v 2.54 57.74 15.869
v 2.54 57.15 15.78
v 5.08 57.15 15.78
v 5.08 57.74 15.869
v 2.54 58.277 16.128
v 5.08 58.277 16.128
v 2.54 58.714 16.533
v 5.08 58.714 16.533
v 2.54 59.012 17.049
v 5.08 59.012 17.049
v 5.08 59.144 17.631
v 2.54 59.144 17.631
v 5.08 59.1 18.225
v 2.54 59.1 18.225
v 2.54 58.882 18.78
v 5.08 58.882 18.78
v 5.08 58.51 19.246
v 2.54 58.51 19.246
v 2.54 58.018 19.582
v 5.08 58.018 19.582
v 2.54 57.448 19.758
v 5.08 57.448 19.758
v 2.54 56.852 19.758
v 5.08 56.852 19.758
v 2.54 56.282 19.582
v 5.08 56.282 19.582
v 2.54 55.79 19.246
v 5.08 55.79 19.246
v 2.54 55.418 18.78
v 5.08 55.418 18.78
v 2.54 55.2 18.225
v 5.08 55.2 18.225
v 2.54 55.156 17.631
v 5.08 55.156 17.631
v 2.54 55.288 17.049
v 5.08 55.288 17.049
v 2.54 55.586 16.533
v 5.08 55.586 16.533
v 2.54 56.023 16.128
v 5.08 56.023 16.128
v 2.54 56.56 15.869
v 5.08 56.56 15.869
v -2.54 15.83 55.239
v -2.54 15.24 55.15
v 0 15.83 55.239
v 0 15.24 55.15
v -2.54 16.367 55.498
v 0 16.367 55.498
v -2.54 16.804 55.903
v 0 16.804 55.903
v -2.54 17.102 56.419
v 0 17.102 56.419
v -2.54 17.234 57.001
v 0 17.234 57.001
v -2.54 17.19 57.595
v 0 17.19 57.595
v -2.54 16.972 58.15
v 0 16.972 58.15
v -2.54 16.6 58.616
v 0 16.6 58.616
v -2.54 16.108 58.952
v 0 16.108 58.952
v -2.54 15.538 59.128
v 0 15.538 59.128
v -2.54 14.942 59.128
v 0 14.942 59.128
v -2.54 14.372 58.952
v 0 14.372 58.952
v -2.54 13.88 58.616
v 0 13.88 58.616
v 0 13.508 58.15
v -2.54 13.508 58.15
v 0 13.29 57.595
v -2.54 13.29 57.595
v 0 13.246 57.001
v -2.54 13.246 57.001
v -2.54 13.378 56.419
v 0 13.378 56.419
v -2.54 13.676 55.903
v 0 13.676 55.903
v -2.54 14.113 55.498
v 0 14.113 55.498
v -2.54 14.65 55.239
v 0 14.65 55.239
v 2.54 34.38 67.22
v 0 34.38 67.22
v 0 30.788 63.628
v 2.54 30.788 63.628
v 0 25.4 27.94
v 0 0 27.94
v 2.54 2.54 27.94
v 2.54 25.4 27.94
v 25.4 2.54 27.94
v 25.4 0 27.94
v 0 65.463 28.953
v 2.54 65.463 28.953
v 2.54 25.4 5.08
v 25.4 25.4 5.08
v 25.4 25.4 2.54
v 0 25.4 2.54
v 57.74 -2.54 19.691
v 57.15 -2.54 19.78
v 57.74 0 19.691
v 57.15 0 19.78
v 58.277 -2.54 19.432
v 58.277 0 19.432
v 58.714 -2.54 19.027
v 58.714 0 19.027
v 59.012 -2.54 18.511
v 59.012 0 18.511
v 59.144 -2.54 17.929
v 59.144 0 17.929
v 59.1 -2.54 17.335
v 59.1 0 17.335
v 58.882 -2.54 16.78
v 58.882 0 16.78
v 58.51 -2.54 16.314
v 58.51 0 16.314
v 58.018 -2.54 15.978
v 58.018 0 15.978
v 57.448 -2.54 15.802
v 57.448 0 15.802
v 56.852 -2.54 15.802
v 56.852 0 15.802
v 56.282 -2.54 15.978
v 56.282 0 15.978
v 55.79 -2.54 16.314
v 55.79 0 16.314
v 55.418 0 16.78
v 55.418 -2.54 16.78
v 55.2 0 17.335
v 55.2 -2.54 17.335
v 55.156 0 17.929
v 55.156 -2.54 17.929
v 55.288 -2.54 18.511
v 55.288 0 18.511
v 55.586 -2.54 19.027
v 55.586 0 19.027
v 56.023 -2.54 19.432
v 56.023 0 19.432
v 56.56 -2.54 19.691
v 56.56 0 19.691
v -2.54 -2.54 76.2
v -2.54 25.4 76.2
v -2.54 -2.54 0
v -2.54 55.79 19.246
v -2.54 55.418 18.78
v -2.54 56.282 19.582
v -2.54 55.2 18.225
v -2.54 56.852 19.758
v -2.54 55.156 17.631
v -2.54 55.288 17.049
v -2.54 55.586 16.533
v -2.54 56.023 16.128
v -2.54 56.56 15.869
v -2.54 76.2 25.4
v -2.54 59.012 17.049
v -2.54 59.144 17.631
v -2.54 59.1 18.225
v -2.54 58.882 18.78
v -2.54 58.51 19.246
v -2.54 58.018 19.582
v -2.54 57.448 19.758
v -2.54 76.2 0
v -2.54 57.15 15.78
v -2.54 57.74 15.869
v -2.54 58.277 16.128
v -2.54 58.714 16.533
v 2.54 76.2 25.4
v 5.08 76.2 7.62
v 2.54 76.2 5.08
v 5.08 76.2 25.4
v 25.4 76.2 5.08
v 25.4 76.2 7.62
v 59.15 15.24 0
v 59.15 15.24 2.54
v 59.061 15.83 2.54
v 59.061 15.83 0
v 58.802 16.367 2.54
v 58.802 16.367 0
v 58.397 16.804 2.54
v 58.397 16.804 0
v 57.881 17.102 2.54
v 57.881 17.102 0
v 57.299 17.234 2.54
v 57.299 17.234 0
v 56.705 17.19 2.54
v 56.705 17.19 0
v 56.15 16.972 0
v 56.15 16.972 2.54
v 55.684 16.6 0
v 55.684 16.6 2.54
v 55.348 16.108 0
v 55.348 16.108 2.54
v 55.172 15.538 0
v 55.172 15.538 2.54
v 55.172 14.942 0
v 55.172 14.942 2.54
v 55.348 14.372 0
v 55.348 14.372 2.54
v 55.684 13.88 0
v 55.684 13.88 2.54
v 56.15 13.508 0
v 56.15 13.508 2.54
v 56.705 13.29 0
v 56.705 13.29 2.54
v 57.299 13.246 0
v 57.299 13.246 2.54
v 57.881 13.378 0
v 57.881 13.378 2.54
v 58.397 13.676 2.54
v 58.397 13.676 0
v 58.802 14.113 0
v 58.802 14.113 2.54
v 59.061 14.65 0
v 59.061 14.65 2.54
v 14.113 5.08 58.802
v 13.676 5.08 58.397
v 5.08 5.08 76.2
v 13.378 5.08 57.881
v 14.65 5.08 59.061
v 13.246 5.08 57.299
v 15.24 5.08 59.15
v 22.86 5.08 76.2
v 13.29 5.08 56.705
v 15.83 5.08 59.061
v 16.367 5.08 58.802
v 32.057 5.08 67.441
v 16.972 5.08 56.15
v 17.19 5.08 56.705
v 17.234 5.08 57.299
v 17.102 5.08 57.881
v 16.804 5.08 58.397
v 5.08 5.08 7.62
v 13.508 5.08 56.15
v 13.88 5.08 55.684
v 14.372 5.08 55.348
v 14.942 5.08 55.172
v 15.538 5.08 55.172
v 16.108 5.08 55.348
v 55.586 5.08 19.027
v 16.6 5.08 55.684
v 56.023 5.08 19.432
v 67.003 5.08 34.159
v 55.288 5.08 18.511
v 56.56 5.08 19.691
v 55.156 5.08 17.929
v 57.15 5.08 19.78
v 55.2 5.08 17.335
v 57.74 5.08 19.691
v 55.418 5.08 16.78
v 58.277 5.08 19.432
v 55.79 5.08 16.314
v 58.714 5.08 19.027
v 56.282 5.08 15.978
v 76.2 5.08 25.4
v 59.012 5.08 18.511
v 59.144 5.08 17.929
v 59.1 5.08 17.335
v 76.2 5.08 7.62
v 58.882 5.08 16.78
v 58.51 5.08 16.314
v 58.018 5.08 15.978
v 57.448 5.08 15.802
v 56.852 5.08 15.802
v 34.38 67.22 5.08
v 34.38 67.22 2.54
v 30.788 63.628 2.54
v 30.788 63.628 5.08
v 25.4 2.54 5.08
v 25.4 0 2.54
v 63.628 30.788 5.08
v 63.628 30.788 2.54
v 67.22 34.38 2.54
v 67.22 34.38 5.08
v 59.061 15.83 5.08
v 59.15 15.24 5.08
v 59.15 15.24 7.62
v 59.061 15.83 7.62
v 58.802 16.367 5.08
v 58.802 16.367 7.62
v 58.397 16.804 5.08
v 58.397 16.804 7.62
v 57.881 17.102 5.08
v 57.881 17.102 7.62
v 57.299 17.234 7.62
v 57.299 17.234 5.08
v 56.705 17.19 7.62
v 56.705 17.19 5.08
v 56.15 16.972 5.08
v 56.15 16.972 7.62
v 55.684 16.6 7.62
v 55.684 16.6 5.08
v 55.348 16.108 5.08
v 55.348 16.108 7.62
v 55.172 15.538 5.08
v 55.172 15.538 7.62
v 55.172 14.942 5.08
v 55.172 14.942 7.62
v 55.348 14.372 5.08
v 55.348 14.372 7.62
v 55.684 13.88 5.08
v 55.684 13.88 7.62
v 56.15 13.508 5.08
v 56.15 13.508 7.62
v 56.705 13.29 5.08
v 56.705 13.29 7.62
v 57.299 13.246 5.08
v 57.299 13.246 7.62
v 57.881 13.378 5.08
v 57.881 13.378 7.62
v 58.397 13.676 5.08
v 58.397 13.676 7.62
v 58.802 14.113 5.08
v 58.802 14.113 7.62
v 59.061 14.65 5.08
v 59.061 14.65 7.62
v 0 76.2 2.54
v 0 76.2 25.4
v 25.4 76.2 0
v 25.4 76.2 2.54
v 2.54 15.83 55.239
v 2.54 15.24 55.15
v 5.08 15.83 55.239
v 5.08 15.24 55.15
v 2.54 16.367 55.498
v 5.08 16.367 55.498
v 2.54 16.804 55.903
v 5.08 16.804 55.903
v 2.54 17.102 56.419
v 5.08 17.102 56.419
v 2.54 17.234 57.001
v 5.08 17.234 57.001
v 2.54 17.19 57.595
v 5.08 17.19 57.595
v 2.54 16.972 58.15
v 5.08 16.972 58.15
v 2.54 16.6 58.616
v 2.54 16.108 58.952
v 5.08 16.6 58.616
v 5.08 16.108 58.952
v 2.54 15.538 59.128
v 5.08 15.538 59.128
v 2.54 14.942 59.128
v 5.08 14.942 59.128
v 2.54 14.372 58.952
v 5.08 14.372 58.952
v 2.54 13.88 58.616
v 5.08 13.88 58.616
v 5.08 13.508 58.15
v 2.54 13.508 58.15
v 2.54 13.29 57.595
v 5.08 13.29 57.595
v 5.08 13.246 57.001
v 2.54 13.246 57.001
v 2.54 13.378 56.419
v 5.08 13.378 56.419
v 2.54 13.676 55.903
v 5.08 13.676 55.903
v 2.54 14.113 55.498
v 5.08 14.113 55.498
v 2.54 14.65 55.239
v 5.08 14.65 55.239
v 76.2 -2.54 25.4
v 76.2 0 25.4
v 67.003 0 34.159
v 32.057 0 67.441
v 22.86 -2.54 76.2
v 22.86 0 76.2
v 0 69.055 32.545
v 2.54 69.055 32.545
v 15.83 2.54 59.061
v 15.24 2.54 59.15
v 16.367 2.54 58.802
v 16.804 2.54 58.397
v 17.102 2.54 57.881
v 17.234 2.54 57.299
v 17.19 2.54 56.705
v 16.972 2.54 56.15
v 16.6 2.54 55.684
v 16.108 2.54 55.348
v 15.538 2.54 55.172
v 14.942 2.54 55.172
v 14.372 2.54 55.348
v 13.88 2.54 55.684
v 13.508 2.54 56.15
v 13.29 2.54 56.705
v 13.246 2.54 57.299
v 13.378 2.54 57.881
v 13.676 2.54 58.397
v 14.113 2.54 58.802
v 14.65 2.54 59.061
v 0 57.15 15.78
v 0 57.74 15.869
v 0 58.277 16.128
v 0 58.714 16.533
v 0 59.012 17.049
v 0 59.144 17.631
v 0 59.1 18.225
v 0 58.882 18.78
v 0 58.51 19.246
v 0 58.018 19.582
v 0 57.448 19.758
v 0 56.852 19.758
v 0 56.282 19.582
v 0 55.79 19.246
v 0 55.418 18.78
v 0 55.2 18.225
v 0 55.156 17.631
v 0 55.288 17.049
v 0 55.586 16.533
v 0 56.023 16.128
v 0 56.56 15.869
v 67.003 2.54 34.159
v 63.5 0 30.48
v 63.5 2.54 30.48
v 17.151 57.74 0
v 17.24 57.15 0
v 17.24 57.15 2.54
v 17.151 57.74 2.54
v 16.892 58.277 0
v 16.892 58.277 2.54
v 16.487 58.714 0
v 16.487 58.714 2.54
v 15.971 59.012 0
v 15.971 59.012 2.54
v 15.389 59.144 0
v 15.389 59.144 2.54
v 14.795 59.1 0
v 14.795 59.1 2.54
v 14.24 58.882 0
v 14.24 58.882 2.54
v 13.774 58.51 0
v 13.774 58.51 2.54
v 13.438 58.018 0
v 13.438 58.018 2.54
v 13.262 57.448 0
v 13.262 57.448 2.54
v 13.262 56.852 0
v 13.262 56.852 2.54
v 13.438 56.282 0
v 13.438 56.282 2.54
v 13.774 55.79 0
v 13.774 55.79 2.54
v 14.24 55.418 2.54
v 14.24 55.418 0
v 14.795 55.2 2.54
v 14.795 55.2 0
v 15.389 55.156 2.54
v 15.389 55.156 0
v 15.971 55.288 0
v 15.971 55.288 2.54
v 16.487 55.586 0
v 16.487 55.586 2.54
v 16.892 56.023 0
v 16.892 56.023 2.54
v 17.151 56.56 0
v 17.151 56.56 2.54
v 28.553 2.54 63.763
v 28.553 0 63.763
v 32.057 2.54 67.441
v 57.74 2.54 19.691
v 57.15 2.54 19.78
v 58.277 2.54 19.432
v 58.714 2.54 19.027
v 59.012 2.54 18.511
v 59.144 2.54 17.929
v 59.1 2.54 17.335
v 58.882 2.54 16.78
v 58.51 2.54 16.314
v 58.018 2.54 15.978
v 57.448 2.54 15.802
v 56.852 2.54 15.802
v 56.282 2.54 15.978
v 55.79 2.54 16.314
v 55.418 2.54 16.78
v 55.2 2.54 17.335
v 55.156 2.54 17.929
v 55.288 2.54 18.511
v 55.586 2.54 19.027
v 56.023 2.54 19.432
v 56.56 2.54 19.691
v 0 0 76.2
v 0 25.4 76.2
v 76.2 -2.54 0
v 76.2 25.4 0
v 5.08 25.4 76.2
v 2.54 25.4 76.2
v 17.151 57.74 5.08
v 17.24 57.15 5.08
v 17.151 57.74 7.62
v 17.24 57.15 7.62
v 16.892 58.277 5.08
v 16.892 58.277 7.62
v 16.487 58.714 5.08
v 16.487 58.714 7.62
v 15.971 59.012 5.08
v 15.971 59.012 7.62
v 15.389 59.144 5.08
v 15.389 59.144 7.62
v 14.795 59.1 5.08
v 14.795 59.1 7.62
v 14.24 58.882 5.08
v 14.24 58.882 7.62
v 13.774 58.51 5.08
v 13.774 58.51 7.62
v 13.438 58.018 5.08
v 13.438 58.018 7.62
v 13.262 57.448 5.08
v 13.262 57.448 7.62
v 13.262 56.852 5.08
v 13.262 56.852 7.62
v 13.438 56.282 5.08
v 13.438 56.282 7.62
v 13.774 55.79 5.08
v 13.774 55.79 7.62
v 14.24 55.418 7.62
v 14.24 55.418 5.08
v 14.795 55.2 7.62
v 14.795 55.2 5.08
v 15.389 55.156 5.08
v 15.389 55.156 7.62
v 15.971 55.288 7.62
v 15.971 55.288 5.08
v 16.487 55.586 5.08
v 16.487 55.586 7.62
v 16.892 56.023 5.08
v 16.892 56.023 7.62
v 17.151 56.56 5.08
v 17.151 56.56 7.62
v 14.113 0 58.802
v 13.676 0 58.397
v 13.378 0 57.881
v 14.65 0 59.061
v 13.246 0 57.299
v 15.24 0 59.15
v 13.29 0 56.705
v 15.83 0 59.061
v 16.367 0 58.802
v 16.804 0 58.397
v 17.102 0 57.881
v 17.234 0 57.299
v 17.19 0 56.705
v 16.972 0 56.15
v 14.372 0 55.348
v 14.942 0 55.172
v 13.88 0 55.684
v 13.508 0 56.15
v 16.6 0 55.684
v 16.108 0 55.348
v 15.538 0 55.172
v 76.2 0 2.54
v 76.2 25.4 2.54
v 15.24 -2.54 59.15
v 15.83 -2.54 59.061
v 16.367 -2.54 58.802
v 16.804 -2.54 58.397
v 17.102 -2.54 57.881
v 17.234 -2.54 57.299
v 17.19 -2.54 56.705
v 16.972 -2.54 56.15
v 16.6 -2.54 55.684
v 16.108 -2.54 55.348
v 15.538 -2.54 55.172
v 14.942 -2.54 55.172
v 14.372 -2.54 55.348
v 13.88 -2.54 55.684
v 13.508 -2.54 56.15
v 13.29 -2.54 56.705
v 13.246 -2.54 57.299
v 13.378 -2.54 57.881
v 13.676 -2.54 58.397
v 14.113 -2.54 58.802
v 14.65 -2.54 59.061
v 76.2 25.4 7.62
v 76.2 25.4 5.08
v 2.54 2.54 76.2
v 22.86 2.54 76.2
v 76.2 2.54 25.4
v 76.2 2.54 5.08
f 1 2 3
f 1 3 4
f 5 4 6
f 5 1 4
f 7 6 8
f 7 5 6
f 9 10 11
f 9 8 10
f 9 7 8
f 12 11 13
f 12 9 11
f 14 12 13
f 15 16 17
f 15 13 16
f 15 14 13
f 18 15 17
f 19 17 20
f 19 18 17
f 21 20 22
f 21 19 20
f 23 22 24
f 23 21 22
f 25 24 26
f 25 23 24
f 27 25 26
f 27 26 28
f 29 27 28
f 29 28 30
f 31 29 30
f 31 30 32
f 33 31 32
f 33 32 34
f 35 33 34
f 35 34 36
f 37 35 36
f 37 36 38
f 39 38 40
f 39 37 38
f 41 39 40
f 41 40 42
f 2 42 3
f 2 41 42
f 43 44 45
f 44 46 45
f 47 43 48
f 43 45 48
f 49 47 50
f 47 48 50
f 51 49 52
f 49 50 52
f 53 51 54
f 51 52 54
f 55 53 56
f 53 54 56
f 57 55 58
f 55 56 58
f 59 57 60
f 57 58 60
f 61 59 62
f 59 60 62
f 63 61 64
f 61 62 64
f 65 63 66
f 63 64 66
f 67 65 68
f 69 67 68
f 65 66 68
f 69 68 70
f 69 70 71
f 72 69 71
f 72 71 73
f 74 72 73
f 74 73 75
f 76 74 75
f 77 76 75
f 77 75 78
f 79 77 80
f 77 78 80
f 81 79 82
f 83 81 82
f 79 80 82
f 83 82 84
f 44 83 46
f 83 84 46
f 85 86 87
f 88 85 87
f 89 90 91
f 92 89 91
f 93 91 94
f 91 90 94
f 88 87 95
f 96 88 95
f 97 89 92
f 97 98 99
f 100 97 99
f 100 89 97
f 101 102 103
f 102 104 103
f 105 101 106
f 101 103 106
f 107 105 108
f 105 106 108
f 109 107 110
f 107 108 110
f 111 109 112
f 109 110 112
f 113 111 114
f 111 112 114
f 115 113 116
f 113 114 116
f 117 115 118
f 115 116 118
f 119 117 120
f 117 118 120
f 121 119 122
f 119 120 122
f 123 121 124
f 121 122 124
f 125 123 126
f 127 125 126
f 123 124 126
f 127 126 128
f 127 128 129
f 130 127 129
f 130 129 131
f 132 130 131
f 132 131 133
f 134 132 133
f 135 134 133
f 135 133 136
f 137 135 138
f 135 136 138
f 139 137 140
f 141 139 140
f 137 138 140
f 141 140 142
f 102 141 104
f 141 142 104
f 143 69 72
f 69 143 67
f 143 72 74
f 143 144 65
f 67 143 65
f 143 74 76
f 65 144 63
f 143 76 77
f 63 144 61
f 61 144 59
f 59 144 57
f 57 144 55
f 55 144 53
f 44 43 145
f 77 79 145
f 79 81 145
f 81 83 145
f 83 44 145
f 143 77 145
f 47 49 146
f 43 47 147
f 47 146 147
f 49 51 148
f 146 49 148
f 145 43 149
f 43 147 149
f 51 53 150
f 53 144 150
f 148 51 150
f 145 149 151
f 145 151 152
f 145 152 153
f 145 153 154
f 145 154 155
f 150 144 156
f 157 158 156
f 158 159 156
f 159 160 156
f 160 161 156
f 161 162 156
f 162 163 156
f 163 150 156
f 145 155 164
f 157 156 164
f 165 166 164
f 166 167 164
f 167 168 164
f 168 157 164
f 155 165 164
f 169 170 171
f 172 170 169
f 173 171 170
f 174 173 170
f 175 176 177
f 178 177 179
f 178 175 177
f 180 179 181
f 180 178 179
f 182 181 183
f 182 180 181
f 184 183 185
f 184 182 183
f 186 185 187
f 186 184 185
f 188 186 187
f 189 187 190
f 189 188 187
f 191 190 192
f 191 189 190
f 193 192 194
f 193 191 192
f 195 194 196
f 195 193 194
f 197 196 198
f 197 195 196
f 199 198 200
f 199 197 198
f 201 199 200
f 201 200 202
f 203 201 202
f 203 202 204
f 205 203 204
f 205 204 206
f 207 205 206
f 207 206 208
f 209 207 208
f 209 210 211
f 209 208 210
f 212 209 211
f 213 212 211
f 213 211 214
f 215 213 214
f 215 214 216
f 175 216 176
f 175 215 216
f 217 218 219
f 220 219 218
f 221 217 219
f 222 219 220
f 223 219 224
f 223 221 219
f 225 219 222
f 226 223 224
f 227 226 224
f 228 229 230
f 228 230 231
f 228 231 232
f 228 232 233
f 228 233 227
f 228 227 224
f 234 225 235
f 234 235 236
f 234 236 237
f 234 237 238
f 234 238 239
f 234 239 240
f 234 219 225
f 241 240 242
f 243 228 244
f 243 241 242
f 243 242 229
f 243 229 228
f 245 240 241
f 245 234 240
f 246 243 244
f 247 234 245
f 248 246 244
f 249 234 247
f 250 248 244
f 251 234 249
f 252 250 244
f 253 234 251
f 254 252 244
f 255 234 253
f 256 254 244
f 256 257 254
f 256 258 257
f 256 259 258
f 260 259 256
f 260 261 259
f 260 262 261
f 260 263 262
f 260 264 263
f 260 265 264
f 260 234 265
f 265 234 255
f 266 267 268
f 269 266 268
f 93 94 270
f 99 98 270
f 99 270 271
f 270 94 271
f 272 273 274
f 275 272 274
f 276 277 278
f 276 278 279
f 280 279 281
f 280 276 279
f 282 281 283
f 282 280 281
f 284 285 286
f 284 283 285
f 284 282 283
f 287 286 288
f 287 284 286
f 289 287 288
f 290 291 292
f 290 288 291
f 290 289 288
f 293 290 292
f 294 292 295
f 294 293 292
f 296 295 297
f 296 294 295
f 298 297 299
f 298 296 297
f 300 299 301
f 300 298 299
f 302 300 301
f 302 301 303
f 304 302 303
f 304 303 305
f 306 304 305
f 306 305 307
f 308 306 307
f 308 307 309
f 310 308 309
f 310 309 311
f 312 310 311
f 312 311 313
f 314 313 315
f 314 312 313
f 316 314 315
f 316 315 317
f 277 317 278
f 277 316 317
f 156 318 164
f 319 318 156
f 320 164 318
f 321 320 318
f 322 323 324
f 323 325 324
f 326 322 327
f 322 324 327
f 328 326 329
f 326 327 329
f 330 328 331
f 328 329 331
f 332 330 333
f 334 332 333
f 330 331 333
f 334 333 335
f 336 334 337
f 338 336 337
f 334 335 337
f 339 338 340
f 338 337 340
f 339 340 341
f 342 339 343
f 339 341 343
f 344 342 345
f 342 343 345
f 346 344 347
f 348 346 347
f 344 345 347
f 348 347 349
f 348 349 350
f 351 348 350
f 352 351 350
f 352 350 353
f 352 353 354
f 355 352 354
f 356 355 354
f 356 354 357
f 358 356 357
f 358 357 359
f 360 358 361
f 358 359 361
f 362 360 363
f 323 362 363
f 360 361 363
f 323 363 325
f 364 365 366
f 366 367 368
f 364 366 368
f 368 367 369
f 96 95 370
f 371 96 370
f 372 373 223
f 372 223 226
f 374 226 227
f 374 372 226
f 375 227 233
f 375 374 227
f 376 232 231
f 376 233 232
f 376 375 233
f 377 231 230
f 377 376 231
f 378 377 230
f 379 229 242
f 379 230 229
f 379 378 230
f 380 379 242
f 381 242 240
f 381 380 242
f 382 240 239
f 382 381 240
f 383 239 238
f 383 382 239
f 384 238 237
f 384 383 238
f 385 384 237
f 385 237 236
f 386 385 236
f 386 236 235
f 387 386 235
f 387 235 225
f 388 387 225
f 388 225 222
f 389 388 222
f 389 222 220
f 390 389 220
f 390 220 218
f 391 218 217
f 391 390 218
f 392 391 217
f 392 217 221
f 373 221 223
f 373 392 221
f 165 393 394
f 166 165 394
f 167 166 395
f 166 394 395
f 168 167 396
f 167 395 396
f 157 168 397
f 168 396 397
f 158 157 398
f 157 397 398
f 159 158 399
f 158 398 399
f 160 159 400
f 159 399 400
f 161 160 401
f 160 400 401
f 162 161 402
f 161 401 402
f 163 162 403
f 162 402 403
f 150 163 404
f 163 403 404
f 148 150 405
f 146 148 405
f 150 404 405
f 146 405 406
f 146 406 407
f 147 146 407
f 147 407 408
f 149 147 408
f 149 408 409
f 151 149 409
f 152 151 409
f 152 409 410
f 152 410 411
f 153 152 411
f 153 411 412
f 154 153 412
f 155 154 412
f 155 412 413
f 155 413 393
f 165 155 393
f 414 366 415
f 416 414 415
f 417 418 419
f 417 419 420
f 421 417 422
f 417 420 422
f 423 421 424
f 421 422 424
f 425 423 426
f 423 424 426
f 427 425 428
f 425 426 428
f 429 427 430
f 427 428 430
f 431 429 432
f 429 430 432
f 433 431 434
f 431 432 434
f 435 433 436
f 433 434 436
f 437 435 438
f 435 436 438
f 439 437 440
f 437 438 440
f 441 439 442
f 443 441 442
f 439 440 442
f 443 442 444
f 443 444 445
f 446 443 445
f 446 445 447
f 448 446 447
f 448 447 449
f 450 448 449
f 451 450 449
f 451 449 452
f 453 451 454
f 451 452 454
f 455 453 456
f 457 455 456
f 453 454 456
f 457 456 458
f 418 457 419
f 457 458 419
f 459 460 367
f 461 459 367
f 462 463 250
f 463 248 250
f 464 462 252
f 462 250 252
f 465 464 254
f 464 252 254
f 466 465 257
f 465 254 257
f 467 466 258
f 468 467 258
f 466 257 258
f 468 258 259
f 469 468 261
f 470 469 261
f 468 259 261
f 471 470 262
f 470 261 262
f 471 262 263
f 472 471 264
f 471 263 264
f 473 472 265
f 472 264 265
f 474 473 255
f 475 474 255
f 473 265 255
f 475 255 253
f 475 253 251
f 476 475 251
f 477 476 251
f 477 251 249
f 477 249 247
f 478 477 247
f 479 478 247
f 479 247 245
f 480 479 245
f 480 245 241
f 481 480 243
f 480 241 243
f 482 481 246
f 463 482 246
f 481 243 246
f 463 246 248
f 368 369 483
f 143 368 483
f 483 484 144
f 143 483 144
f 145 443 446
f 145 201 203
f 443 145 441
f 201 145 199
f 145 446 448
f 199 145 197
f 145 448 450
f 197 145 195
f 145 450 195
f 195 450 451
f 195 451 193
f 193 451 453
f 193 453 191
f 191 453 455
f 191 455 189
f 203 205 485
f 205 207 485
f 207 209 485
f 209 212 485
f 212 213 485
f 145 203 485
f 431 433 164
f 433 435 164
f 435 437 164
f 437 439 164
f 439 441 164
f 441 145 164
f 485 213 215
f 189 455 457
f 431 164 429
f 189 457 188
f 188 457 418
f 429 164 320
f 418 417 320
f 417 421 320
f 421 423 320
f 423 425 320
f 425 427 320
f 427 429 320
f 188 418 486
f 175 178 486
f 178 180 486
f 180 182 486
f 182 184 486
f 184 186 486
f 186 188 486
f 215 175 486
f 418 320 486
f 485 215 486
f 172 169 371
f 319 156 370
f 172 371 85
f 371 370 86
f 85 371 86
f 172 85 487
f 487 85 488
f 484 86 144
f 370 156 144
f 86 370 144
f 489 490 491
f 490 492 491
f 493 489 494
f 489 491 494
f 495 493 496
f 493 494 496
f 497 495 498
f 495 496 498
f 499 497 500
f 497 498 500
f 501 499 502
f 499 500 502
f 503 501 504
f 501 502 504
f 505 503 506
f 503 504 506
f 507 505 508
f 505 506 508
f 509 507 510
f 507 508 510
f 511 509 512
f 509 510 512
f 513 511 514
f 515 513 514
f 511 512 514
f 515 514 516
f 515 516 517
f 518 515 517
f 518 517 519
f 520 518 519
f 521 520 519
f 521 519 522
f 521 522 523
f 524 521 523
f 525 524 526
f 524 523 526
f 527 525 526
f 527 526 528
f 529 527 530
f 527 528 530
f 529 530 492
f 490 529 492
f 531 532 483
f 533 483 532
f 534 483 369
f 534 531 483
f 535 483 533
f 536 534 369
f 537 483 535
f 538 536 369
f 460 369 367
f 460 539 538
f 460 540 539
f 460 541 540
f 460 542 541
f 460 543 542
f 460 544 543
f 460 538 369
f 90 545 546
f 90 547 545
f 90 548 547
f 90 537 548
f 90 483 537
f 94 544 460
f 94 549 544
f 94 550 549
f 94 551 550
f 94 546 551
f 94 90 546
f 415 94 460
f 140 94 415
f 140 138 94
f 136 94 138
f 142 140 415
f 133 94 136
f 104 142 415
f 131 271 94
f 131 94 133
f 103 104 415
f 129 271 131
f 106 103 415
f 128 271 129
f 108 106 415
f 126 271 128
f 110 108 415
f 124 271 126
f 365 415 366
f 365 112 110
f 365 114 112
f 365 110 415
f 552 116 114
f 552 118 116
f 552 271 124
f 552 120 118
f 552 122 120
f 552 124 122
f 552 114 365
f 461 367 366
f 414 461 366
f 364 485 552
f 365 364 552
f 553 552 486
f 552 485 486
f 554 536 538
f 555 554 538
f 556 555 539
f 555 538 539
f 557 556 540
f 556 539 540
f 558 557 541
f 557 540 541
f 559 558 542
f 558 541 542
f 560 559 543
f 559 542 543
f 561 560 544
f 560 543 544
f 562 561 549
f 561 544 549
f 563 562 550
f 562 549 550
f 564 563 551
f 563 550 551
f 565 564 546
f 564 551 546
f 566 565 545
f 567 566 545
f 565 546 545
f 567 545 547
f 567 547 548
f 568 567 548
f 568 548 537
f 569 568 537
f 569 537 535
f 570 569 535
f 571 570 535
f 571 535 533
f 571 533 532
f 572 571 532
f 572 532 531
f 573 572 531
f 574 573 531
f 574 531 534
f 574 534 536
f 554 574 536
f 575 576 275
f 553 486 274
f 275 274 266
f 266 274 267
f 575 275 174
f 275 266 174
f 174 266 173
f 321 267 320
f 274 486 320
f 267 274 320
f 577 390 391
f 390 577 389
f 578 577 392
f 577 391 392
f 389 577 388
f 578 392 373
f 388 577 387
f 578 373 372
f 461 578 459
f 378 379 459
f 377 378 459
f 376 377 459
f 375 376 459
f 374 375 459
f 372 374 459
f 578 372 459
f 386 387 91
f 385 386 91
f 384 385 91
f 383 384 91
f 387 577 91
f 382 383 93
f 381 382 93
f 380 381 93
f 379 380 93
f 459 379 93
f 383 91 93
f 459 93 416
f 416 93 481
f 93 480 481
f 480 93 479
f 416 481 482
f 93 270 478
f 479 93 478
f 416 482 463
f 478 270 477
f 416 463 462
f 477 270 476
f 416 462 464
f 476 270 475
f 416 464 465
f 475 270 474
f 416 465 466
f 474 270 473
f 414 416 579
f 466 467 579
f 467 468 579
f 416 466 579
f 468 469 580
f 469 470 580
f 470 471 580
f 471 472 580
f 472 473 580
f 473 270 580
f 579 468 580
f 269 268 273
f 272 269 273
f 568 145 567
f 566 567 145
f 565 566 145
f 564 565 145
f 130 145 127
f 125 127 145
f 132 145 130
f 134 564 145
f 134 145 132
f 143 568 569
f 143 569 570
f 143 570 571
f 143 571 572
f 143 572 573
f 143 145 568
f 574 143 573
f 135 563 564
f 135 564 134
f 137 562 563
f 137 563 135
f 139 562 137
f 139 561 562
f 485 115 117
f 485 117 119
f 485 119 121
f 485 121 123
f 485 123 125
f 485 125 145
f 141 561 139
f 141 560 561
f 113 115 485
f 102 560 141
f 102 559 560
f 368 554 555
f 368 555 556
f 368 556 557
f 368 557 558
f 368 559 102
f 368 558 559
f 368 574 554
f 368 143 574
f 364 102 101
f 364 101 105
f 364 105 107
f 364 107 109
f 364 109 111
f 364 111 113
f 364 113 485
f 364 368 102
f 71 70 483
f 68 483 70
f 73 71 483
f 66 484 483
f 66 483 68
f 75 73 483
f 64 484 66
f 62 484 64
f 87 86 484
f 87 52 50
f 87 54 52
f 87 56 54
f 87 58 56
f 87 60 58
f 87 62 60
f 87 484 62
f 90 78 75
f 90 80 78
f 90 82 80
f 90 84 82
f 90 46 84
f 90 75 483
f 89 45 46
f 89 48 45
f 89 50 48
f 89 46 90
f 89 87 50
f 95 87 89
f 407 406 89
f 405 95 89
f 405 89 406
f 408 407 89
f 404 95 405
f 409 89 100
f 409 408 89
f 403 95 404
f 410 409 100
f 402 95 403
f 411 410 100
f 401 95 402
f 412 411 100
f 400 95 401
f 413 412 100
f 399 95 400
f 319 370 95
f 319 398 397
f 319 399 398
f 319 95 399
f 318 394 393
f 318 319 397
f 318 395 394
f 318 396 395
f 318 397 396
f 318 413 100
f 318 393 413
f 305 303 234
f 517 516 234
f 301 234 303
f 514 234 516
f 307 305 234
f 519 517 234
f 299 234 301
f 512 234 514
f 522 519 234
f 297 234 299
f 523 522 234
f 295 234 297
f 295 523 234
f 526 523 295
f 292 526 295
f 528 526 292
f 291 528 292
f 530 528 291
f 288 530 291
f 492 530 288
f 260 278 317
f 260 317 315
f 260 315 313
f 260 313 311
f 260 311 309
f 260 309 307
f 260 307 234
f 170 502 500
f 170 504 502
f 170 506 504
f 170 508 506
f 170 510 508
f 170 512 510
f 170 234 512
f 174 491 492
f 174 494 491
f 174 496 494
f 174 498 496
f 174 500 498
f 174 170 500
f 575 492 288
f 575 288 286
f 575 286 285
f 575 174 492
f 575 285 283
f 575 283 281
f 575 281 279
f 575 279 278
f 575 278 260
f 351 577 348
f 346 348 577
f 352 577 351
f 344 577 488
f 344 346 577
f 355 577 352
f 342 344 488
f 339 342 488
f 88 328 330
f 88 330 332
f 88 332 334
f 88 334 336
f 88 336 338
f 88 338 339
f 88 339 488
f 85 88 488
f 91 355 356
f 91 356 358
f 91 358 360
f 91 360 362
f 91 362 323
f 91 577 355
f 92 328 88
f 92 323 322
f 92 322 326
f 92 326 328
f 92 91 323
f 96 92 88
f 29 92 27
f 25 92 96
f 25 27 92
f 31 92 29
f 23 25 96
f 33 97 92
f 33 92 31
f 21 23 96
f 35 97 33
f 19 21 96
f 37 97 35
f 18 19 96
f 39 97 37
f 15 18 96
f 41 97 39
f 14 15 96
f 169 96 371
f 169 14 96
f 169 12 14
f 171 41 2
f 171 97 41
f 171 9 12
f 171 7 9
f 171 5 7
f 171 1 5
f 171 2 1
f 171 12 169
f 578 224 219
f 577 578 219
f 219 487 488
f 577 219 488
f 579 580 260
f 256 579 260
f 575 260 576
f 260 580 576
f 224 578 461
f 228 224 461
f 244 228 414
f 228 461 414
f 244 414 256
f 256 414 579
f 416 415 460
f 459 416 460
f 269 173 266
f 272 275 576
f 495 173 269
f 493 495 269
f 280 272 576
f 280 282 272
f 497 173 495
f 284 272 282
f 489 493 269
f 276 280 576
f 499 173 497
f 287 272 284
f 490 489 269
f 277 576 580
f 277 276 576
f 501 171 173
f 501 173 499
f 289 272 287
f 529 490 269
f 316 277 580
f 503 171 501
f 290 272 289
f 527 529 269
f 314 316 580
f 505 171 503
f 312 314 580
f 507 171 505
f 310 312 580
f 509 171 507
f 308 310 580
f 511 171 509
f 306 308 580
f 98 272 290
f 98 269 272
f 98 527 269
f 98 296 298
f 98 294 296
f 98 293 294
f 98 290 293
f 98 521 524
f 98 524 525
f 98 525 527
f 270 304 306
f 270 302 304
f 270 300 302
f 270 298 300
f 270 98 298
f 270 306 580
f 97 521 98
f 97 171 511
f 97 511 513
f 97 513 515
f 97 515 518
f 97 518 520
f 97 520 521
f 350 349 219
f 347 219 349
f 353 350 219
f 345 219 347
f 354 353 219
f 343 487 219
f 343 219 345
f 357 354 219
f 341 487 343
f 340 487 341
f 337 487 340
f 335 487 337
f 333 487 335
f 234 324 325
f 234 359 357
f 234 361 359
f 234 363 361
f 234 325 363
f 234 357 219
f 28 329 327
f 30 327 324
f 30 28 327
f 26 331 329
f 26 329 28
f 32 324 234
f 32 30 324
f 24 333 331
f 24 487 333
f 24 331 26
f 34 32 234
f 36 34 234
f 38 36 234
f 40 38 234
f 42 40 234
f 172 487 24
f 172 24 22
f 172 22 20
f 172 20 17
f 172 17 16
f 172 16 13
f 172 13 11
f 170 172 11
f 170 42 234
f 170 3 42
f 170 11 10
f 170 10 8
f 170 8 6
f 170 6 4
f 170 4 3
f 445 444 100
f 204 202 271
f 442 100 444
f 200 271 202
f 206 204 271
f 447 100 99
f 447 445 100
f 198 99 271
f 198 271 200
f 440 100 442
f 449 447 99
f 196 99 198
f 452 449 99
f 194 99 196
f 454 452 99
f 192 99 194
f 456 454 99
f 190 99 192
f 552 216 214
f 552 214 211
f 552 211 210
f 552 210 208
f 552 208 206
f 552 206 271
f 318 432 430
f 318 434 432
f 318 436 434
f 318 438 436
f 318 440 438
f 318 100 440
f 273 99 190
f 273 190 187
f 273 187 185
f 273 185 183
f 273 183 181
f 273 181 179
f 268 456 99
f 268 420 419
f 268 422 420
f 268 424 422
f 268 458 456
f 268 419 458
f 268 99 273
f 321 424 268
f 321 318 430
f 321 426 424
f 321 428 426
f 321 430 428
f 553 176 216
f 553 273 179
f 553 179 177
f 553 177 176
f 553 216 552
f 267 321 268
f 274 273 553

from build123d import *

# Parameters (mm, degrees)
BOSS_EXTRUDE1_DEPTH  = 2.54
BOSS_EXTRUDE2_DEPTH  = 2.54
BOSS_EXTRUDE3_DEPTH  = 2.54
SKETCH6_W            = 2.54
SKETCH6_H            = 76.2
BOSS_EXTRUDE4_DEPTH  = 76.2
CUT_EXTRUDE1_REACH   = 133.982
SKETCH8_W            = 2.54
SKETCH8_H            = 78.74
BOSS_EXTRUDE5_DEPTH  = 76.2
CUT_EXTRUDE2_REACH   = 133.982
SKETCH10_W           = 78.74
SKETCH10_H           = 2.54
BOSS_EXTRUDE6_DEPTH  = 76.2
CUT_EXTRUDE3_REACH   = 133.982
CUT_EXTRUDE5_DEPTH   = 132.982271537
CUT_EXTRUDE6_DEPTH   = 132.982271537
CUT_EXTRUDE9_DEPTH   = 76.2
BOSS_EXTRUDE7_DEPTH  = 7.62
BOSS_EXTRUDE8_DEPTH  = 5.08
BOSS_EXTRUDE9_DEPTH  = 5.08
SKETCH34_R           = 2
CUT_EXTRUDE11_DEPTH  = 12.7
SKETCH35_R           = 2
CUT_EXTRUDE13_DEPTH  = 12.7
SKETCH36_R           = 2
CUT_EXTRUDE14_DEPTH  = 12.7
BOSS_EXTRUDE10_REACH = 133.982
SKETCH37_W           = 25.4
SKETCH37_H           = 25.4
BOSS_EXTRUDE11_REACH = 133.982
SKETCH38_W           = 25.4
SKETCH38_H           = 25.4
SKETCH39_W           = 25.4
SKETCH39_H           = 25.4
BOSS_EXTRUDE12_DEPTH = 5.08


with BuildPart() as part:
    # Sketch1 → Boss-Extrude1 (new body)
    with BuildSketch(Plane.XY):
        Polygon((0, 76.2), (0, 0), (76.2, 0), (76.2, 25.4), (25.4, 76.2), align=None)
    extrude(amount=BOSS_EXTRUDE1_DEPTH)

    # Sketch3 → Boss-Extrude2 (add)
    with BuildSketch(Plane.ZY):
        Polygon((0, 76.2), (25.4, 76.2), (76.2, 25.4), (76.2, 0), (0, 0), align=None)
    extrude(amount=BOSS_EXTRUDE2_DEPTH)

    # Sketch5 → Boss-Extrude3 (add)
    with BuildSketch(Plane.XZ):
        Polygon((-2.54, 76.2), (-2.54, 0), (76.2, 0), (76.2, 25.4), (22.86, 76.2), align=None)
    extrude(amount=BOSS_EXTRUDE3_DEPTH)

    # Sketch6 → Boss-Extrude4 (add)
    with BuildSketch(Plane.XY):
        with Locations((3.81, 38.1)):
            Rectangle(SKETCH6_W, SKETCH6_H)
    extrude(amount=BOSS_EXTRUDE4_DEPTH)

    # Sketch7 → Cut-Extrude1 (cut, up to next)
    with BuildSketch(Plane(origin=(0, 0, 0), x_dir=(0, 0, -1), z_dir=(1, 0, 0)), mode=Mode.PRIVATE) as cut_extrude1_sk1:
        Polygon((-25.4, 76.2), (-76.2, 25.4), (-76.2, 76.2), align=None)
    cut_extrude1_tool1 = extrude(cut_extrude1_sk1.sketch, amount=CUT_EXTRUDE1_REACH, mode=Mode.PRIVATE) & part.part
    add(cut_extrude1_tool1.solids().sort_by_distance((0, 59.266667, 59.266667))[0], mode=Mode.SUBTRACT)

    # Sketch8 → Boss-Extrude5 (add)
    with BuildSketch(Plane(origin=(0, 0, 0), x_dir=(0, 0, -1), z_dir=(1, 0, 0))):
        with Locations((-6.35, 36.83)):
            Rectangle(SKETCH8_W, SKETCH8_H)
    extrude(amount=BOSS_EXTRUDE5_DEPTH)

    # Sketch9 → Cut-Extrude2 (cut, up to next)
    with BuildSketch(Plane.XY, mode=Mode.PRIVATE) as cut_extrude2_sk1:
        Polygon((76.2, 25.4), (25.4, 76.2), (76.2, 76.2), align=None)
    cut_extrude2_tool1 = extrude(cut_extrude2_sk1.sketch, amount=CUT_EXTRUDE2_REACH, mode=Mode.PRIVATE) & part.part
    add(cut_extrude2_tool1.solids().sort_by_distance((59.266667, 59.266667, 0))[0], mode=Mode.SUBTRACT)

    # Sketch10 → Boss-Extrude6 (add)
    with BuildSketch(Plane.XY):
        with Locations((36.83, 3.81)):
            Rectangle(SKETCH10_W, SKETCH10_H)
    extrude(amount=BOSS_EXTRUDE6_DEPTH)

    # Sketch11 → Cut-Extrude3 (cut, up to next)
    with BuildSketch(Plane(origin=(0, 0, 0), x_dir=(1, 0, 0), z_dir=(0, 1, 0)), mode=Mode.PRIVATE) as cut_extrude3_sk1:
        Polygon((22.86, -76.2), (76.2, -25.4), (76.2, -76.2), align=None)
    cut_extrude3_tool1 = extrude(cut_extrude3_sk1.sketch, amount=CUT_EXTRUDE3_REACH, mode=Mode.PRIVATE) & part.part
    add(cut_extrude3_tool1.solids().sort_by_distance((58.42, 0, 59.266667))[0], mode=Mode.SUBTRACT)

    # Sketch12 → Cut-Extrude5 (cut, through all)
    with BuildSketch(Plane(origin=(0, 0, 0), x_dir=(0, 0, -1), z_dir=(1, 0, 0))):
        Polygon((-5.08, 5.08), (-5.08, 2.54), (-7.62, 2.54), (-7.62, 0), (-2.54, 0), (-2.54, 5.08), align=None)
    extrude(amount=CUT_EXTRUDE5_DEPTH, mode=Mode.SUBTRACT)

    # Sketch13 → Cut-Extrude6 (cut, through all)
    with BuildSketch(Plane(origin=(0, 0, 0), x_dir=(1, 0, 0), z_dir=(0, 1, 0))):
        Polygon((0, -2.54), (0, -7.62), (2.54, -7.62), (2.54, -5.08), (5.08, -5.08), (5.08, -2.54), align=None)
    extrude(amount=CUT_EXTRUDE6_DEPTH, mode=Mode.SUBTRACT)

    # Sketch15 → Cut-Extrude9 (cut)
    with BuildSketch(Plane.XY.offset(2.54)):
        Polygon((2.54, 5.08), (0, 5.08), (0, 0), (5.08, 0), (5.08, 2.54), (2.54, 2.54), align=None)
    extrude(amount=CUT_EXTRUDE9_DEPTH, mode=Mode.SUBTRACT)


with BuildPart() as cut_extrude9_piece_1:
    # of the separate pieces the step leaves, piece 1, a body of its own (cut_extrude9_pieces)
    add(part.part.solids().sort_by_distance((0, 0, 2.54))[0])



with BuildPart() as cut_extrude9_piece_2:
    # of the separate pieces the step leaves, piece 2, a body of its own (cut_extrude9_pieces)
    add(part.part.solids().sort_by_distance((2.54, 2.54, 76.2))[0])


with BuildPart() as cut_extrude9_piece_1_1:
    add(cut_extrude9_piece_1.part)

    add(cut_extrude9_piece_2.part)  # Boss-Extrude7 merges Cut-Extrude9 piece 2
    # Sketch17 → Boss-Extrude7 (add)
    with BuildSketch(Plane(origin=(0, 0, 0), x_dir=(-1, 0, 0), z_dir=(0, 0, -1))):
        Polygon((-67.219743879, 34.380256121), (-34.380256121, 67.219743879), (-30.788153673, 63.627641431), (-63.627641431, 30.788153673), align=None)
    extrude(amount=-BOSS_EXTRUDE7_DEPTH)

    # Sketch18 → Boss-Extrude8 (add)
    with BuildSketch(Plane(origin=(0, 0, 0), x_dir=(1, 0, 0), z_dir=(0, 1, 0))):
        Polygon((32.056551724, -67.44137931), (67.003448276, -34.15862069), (63.5, -30.48), (28.553103448, -63.762758621), align=None)
    extrude(amount=BOSS_EXTRUDE8_DEPTH)

    # Sketch19 → Boss-Extrude9 (add)
    with BuildSketch(Plane(origin=(0, 0, 0), x_dir=(0, 0, -1), z_dir=(1, 0, 0))):
        Polygon((-32.545001849, 69.054998151), (-67.219743879, 34.380256121), (-63.627641431, 30.788153673), (-28.9528994, 65.462895703), align=None)
    extrude(amount=BOSS_EXTRUDE9_DEPTH)

    # Sketch34 → Cut-Extrude11 (cut, symmetric)
    with BuildSketch(Plane(origin=(0, 0, 0), x_dir=(0, 0, -1), z_dir=(1, 0, 0))):
        with Locations((-17.78, 57.15)):
            Circle(SKETCH34_R)
        with Locations((-57.15, 15.24)):
            Circle(SKETCH34_R)
    extrude(amount=CUT_EXTRUDE11_DEPTH, both=True, mode=Mode.SUBTRACT)

    # Sketch35 → Cut-Extrude13 (cut, symmetric)
    with BuildSketch(Plane(origin=(0, 0, 0), x_dir=(1, 0, 0), z_dir=(0, 1, 0))):
        with Locations(Location((15.24, -57.15, 0), (0, 0, 270))):
            Circle(SKETCH35_R)
        with Locations(Location((57.15, -17.78, 0), (0, 0, 270))):
            Circle(SKETCH35_R)
    extrude(amount=CUT_EXTRUDE13_DEPTH, both=True, mode=Mode.SUBTRACT)

    # Sketch36 → Cut-Extrude14 (cut, symmetric)
    with BuildSketch(Plane.XY):
        with Locations((57.15, 15.24)):
            Circle(SKETCH36_R)
        with Locations((15.24, 57.15)):
            Circle(SKETCH36_R)
    extrude(amount=CUT_EXTRUDE14_DEPTH, both=True, mode=Mode.SUBTRACT)

    # Boss-Extrude10: up to this face of the body (flat: up to its plane)
    boss_extrude10_end = Plane(cut_extrude9_piece_1_1.part.faces().sort_by_distance((34.248017182, 34.248017182, 7.62))[0])
    # Sketch37 → Boss-Extrude10 (add, up to the picked face)
    with BuildSketch(Plane.XY, mode=Mode.PRIVATE) as boss_extrude10_sk1:
        with Locations((12.7, 12.7)):
            Rectangle(SKETCH37_W, SKETCH37_H)
    boss_extrude10_tool1 = split(extrude(boss_extrude10_sk1.sketch, amount=BOSS_EXTRUDE10_REACH, mode=Mode.PRIVATE), bisect_by=boss_extrude10_end, keep=Keep.BOTH, mode=Mode.PRIVATE)
    add(boss_extrude10_tool1.solids().sort_by(Axis((12.7, 12.7, 0), (0, 0, 1)))[0])

    # Boss-Extrude11: up to this face of the body (flat: up to its plane)
    boss_extrude11_end = Plane(cut_extrude9_piece_1_1.part.faces().sort_by_distance((33.784338957, 5.08, 35.218329504))[0])
    # Sketch38 → Boss-Extrude11 (add, up to the picked face)
    with BuildSketch(Plane(origin=(0, 0, 0), x_dir=(1, 0, 0), z_dir=(0, 1, 0)), mode=Mode.PRIVATE) as boss_extrude11_sk1:
        with Locations((12.7, -15.24)):
            Rectangle(SKETCH38_W, SKETCH38_H)
    boss_extrude11_tool1 = split(extrude(boss_extrude11_sk1.sketch, amount=BOSS_EXTRUDE11_REACH, mode=Mode.PRIVATE), bisect_by=boss_extrude11_end, keep=Keep.BOTH, mode=Mode.PRIVATE)
    add(boss_extrude11_tool1.solids().sort_by(Axis((12.7, 0, 15.24), (0, 1, 0)))[0])

    # Sketch39 → Boss-Extrude12 (add)
    with BuildSketch(Plane(origin=(0, 0, 0), x_dir=(0, 0, -1), z_dir=(1, 0, 0))):
        with Locations((-15.24, 12.7)):
            Rectangle(SKETCH39_W, SKETCH39_H)
    extrude(amount=BOSS_EXTRUDE12_DEPTH)


solid = cut_extrude9_piece_1_1.part
